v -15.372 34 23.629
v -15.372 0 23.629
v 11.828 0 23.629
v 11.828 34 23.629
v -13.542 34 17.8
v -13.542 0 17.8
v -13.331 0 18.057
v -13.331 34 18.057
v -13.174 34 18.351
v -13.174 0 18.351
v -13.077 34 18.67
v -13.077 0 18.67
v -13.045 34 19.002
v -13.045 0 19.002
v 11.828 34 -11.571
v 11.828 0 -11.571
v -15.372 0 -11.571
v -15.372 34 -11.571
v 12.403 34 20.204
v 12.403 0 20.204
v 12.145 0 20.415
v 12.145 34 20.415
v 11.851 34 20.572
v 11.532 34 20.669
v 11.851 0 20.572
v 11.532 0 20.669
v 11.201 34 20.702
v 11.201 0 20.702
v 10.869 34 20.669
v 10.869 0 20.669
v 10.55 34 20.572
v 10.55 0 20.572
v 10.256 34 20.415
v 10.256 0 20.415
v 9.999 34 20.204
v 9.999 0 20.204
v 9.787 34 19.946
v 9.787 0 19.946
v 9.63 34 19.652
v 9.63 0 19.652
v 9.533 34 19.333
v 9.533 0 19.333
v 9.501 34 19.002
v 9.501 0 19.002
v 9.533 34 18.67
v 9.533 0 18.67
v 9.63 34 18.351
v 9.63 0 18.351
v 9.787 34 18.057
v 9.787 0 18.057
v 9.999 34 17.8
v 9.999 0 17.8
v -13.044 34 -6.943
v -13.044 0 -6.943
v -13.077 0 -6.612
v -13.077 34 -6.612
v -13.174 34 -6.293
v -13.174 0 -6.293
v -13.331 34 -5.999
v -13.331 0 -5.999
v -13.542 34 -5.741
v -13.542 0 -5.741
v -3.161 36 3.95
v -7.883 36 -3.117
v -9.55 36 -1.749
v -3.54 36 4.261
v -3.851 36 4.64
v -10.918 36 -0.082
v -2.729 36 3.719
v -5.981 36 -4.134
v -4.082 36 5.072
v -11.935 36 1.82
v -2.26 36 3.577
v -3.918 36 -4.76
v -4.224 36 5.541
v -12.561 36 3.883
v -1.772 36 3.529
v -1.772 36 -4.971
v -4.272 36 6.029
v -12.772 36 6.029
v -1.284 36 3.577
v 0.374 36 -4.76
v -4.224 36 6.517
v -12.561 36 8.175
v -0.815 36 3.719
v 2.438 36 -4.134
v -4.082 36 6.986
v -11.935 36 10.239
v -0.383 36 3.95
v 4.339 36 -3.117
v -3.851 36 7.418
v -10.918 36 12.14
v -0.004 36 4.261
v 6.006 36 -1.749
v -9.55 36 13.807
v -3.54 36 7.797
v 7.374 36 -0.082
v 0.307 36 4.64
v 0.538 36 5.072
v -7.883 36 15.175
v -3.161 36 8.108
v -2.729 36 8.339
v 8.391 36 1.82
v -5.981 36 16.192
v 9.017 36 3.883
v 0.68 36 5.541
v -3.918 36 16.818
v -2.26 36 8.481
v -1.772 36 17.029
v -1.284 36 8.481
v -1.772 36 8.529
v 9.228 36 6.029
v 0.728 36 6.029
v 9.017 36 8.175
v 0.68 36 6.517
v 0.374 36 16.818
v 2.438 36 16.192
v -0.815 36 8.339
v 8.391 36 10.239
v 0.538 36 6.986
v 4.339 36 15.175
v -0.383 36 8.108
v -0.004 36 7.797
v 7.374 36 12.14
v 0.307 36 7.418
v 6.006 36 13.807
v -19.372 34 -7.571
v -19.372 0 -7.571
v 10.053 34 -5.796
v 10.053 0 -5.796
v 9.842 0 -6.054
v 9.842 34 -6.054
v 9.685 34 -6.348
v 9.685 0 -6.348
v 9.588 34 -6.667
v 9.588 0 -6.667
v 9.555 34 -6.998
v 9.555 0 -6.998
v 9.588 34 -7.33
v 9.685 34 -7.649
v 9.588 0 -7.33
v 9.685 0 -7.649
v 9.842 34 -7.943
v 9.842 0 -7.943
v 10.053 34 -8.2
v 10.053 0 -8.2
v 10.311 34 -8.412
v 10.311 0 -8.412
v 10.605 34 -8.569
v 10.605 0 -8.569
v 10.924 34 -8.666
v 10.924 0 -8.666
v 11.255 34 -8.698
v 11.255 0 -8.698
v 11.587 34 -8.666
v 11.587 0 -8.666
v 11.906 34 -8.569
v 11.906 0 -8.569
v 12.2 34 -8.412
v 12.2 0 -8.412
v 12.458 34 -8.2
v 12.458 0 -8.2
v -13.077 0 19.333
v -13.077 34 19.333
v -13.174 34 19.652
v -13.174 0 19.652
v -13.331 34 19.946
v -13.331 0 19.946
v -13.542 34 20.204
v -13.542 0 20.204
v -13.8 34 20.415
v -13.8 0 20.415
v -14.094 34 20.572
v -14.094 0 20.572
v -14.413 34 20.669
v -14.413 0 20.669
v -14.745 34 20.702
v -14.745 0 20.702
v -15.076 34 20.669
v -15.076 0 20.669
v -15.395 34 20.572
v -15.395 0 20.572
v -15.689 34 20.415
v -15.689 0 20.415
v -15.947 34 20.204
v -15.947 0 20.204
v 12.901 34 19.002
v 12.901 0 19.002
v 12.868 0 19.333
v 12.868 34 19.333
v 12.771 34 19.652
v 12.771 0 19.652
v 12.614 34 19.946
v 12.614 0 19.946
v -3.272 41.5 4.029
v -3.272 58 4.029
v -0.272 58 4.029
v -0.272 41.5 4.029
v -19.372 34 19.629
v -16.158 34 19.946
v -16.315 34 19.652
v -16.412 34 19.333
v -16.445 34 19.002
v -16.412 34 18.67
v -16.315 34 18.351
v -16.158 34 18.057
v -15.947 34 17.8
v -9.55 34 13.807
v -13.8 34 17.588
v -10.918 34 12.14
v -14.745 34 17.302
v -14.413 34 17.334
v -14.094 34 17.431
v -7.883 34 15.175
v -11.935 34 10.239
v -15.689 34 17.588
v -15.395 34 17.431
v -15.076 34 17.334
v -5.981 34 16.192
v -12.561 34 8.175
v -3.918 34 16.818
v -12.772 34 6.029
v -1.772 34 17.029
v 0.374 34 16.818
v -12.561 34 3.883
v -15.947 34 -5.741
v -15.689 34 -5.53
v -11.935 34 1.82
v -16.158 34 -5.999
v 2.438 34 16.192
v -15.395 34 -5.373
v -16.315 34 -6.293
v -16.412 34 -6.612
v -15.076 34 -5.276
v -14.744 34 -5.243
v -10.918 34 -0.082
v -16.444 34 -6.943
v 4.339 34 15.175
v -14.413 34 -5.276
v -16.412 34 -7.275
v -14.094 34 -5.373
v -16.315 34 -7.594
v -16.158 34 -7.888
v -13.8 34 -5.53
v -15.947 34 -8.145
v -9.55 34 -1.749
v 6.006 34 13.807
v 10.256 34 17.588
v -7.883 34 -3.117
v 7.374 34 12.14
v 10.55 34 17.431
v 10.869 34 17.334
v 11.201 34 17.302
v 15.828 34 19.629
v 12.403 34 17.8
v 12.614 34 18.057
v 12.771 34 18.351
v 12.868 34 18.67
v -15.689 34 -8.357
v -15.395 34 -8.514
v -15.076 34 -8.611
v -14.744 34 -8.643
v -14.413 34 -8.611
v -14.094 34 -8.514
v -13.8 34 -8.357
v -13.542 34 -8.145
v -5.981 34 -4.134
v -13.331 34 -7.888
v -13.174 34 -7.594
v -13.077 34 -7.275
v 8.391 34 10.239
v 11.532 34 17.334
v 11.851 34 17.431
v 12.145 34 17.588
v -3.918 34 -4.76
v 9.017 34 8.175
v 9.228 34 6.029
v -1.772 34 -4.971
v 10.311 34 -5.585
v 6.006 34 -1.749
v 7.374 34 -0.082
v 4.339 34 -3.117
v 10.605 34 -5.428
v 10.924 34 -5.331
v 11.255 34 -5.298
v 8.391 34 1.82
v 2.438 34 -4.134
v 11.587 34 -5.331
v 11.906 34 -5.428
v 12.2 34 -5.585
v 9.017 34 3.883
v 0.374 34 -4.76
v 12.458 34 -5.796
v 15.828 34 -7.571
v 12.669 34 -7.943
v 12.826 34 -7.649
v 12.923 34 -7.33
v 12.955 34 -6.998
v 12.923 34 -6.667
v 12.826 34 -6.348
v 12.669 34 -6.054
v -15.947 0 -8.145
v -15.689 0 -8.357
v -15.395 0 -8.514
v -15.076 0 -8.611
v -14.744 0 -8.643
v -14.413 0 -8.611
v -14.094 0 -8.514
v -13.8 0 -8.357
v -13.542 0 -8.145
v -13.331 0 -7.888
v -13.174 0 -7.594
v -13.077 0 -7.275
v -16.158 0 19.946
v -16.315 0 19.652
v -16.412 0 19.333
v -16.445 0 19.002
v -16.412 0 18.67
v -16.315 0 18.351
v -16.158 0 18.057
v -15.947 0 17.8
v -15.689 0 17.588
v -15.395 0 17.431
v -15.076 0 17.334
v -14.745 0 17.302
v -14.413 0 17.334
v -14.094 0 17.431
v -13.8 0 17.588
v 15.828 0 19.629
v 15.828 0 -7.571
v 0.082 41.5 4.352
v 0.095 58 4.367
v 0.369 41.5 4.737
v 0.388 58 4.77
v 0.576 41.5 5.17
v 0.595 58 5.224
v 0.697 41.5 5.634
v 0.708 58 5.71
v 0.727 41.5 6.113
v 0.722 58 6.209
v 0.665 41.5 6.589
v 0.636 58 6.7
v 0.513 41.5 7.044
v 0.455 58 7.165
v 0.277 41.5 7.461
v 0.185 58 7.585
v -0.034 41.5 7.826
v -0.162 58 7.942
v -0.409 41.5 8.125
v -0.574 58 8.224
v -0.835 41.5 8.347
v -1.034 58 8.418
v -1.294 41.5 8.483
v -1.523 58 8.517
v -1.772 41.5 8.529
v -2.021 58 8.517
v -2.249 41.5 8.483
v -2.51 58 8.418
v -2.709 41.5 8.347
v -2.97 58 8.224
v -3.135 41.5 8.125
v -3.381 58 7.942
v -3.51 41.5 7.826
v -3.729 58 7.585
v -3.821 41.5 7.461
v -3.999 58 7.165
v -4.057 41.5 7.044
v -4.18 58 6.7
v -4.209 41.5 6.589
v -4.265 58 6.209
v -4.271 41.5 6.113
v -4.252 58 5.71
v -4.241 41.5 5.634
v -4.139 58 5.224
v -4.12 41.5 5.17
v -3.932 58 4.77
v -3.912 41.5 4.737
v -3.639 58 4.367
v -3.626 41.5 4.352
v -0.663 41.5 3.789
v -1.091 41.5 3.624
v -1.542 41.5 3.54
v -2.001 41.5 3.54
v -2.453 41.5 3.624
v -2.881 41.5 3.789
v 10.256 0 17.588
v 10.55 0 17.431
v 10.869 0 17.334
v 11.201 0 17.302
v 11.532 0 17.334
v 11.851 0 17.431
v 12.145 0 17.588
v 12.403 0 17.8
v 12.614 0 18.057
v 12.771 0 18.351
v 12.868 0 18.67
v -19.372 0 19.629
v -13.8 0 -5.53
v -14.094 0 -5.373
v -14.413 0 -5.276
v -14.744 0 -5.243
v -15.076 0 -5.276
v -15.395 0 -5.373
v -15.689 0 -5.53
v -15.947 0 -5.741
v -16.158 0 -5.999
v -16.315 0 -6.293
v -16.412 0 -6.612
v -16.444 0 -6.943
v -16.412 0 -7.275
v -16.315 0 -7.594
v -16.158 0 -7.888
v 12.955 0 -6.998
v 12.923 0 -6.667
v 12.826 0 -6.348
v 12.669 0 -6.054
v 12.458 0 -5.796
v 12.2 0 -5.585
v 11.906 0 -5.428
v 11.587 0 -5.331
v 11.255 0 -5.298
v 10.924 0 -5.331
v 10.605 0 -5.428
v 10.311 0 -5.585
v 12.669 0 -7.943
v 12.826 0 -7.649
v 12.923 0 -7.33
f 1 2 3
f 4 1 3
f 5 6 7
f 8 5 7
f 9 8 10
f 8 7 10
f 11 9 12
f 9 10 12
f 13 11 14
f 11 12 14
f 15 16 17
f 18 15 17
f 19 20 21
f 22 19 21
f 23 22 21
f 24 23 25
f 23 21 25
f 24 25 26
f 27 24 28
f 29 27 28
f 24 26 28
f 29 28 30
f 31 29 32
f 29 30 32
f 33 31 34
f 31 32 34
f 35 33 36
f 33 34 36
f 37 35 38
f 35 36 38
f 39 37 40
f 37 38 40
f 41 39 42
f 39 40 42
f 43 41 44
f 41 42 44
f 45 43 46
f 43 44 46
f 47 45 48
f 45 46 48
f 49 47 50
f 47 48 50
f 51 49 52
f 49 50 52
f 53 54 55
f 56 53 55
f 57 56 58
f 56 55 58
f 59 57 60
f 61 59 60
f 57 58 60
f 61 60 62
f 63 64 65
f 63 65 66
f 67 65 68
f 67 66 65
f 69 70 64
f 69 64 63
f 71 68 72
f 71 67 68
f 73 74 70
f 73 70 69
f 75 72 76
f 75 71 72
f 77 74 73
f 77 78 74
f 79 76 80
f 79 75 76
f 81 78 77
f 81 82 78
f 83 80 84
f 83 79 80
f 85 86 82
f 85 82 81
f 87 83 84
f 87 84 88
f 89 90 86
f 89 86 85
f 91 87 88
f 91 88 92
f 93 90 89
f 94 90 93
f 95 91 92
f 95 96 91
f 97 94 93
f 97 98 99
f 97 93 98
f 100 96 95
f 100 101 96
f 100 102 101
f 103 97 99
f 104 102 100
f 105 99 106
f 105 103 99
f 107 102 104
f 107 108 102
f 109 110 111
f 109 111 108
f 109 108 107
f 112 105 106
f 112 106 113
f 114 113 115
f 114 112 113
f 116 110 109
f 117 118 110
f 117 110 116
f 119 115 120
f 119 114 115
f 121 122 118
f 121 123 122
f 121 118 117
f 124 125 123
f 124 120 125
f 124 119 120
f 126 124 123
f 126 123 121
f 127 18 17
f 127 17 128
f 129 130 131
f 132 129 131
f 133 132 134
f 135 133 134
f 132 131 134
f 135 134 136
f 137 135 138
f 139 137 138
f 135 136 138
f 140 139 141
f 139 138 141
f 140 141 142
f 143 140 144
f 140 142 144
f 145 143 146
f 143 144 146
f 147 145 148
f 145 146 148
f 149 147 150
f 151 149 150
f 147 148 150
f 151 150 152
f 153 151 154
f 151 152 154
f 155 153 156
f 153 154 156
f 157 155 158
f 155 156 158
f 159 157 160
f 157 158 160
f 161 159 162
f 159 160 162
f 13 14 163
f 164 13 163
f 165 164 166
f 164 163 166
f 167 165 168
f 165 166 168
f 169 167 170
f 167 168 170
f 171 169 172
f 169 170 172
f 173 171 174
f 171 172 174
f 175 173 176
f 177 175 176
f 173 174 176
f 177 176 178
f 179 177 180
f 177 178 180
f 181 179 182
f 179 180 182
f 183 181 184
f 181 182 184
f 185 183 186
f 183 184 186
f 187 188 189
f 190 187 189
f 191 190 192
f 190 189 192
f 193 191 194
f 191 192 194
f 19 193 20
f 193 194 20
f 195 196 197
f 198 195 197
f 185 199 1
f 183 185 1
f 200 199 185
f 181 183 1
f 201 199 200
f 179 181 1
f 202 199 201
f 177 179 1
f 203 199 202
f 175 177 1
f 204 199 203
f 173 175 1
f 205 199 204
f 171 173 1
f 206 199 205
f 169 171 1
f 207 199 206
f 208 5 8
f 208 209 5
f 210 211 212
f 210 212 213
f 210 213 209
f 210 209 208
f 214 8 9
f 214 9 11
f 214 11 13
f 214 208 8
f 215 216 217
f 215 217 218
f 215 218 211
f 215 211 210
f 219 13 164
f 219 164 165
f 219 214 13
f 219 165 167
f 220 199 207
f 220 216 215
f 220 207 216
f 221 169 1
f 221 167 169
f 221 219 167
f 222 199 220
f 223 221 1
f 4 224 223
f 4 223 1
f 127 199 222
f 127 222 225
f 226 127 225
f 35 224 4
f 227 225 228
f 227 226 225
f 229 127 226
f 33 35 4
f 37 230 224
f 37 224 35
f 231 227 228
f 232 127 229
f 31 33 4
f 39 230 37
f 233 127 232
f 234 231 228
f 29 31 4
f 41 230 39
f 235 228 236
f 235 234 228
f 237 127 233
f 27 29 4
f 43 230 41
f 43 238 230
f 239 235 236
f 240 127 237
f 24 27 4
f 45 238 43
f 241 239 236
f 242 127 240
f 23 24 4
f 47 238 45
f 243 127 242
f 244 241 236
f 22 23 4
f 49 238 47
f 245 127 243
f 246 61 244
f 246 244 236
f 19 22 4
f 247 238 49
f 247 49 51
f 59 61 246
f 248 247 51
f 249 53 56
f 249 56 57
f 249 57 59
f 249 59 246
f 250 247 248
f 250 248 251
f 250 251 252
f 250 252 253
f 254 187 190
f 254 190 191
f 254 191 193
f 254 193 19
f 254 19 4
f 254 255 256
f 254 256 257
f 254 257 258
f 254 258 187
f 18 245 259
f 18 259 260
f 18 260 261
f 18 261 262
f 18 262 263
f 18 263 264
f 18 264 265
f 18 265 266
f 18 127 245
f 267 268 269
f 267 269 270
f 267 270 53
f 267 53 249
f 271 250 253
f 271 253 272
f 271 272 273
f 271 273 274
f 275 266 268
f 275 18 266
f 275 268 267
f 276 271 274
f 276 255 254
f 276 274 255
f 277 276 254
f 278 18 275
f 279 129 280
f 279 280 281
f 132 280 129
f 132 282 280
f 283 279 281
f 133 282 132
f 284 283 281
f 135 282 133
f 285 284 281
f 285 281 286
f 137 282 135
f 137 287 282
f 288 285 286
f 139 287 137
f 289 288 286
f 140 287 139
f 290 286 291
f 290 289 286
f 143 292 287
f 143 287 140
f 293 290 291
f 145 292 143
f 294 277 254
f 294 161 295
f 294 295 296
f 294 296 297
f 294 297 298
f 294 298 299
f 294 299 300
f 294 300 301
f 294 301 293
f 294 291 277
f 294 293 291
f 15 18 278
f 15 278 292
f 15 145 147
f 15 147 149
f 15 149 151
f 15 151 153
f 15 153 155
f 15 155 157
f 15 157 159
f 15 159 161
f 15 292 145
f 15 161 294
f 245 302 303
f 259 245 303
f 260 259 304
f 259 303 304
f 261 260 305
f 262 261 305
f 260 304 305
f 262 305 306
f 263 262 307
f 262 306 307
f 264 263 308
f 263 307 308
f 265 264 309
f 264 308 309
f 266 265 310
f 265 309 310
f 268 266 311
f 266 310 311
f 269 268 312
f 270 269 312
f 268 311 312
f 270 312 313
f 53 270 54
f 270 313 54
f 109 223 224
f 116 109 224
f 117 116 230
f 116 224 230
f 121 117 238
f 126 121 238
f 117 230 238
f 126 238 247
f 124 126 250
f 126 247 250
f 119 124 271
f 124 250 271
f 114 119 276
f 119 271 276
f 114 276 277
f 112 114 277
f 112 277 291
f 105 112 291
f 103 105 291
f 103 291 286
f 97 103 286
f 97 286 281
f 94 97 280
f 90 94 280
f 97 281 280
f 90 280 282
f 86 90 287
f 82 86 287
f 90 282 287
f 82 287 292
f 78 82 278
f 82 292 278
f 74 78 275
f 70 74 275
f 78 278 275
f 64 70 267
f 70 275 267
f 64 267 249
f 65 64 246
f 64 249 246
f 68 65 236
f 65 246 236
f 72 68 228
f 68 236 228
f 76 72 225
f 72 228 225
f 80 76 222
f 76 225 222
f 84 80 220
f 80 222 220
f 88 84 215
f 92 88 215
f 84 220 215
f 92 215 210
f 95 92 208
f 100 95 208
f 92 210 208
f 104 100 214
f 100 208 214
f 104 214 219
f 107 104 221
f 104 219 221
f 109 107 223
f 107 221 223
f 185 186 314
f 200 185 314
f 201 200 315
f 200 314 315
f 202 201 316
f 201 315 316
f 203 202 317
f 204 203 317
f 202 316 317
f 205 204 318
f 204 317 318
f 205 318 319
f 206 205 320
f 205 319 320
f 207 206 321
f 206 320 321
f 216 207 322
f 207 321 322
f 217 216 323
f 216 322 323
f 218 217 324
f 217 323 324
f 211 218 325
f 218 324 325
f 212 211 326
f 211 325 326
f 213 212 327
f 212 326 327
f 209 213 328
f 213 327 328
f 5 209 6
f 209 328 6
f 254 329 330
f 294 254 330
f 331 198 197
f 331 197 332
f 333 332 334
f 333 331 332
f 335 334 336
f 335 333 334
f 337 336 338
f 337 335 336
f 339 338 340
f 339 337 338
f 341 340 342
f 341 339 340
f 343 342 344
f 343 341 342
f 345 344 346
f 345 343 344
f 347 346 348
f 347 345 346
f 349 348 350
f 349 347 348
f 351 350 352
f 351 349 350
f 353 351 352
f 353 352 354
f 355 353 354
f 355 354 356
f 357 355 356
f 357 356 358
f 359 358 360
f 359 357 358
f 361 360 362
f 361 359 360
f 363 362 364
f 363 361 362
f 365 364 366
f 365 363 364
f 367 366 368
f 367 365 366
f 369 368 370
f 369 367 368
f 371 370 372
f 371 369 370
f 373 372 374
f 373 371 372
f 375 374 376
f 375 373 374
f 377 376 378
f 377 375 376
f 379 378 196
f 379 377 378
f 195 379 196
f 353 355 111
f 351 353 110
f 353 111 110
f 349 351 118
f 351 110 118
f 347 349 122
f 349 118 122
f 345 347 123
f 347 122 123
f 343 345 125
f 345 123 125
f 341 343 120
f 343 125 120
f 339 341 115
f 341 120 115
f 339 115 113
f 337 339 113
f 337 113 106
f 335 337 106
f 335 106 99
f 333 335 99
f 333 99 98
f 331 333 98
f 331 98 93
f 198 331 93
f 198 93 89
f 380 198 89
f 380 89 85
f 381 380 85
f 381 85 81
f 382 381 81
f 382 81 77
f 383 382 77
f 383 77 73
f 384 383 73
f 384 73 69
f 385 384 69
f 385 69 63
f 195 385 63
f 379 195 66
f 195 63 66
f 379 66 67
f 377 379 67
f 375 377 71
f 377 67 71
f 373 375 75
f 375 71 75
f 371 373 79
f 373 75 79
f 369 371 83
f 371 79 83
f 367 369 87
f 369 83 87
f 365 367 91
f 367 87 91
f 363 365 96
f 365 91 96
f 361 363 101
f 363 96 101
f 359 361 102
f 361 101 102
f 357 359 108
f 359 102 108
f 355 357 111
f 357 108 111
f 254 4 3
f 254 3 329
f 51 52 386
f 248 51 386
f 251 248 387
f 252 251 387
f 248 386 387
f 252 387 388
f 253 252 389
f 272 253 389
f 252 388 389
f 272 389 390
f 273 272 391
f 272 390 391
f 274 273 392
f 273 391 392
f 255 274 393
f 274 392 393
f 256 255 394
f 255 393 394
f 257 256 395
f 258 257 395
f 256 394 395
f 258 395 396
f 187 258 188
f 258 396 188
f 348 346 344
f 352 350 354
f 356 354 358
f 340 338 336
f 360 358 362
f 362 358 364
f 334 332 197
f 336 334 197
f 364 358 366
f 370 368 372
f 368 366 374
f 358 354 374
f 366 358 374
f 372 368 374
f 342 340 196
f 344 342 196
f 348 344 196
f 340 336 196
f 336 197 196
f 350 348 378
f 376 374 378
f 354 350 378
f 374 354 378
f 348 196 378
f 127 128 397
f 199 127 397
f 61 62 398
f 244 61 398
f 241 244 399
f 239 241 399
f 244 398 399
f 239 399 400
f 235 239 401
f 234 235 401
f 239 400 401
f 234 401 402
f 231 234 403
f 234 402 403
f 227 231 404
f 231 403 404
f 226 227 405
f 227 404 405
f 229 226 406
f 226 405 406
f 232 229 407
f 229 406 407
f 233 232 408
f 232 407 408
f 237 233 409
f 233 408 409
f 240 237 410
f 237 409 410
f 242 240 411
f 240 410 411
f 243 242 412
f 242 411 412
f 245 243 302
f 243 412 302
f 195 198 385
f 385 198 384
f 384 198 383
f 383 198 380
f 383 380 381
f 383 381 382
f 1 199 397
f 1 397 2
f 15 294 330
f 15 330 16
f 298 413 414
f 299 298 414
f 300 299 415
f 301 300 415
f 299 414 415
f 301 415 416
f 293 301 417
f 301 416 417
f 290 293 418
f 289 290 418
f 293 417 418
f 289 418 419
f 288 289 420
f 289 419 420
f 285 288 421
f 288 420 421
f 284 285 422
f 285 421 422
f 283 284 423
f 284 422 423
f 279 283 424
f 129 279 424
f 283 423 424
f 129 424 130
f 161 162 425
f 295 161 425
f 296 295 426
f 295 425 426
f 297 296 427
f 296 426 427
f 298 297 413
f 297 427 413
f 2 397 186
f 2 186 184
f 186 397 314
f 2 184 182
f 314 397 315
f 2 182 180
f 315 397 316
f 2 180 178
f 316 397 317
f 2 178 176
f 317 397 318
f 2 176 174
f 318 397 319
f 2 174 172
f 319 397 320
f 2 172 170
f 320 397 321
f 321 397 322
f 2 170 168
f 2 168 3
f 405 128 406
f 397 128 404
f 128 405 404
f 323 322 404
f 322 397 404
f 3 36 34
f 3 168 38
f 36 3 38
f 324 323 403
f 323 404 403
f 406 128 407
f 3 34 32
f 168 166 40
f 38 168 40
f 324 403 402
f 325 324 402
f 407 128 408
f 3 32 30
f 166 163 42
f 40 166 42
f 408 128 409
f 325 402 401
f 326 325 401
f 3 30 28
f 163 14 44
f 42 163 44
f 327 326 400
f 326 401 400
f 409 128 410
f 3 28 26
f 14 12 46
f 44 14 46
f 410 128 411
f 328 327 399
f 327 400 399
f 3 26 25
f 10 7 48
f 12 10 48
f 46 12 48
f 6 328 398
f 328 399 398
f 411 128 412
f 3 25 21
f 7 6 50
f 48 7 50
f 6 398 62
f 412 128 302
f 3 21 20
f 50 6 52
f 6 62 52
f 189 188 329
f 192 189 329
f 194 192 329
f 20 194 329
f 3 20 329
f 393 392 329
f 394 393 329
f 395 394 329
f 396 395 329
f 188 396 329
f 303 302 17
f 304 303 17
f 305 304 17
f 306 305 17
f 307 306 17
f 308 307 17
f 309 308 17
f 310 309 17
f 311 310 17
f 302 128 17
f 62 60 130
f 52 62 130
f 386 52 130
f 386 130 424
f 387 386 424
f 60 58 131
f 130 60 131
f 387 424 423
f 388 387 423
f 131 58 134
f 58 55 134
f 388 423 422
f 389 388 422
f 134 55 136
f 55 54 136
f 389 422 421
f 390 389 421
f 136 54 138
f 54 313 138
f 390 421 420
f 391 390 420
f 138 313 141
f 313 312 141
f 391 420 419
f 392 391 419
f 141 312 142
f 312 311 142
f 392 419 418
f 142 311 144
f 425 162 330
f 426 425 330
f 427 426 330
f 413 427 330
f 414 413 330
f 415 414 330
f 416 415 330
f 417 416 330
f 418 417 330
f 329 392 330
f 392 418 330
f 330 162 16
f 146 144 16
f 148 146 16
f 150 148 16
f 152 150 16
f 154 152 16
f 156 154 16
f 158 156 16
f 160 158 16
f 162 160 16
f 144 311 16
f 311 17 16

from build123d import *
from build123d.topology import SkipClean

# Parameters (mm, degrees)
SKETCH1_R           = 1.7
BOSS_EXTRUDE1_DEPTH = 34
SKETCH2_R           = 11
BOSS_EXTRUDE2_DEPTH = 2
SKETCH3_R           = 2.5
BOSS_EXTRUDE3_DEPTH = 5.5
BOSS_EXTRUDE4_DEPTH = 16.5


with BuildPart() as part:
    # Sketch1 → Boss-Extrude1 (new body)
    with BuildSketch(Plane(origin=(0, 0, 0), x_dir=(1, 0, 0), z_dir=(0, 1, 0))):
        Polygon((11.828075118, 11.570865707), (-15.371924882, 11.570865707), (-19.371924882, 7.570865707), (-19.371924882, -19.629134293), (-15.371924882, -23.629134293), (11.828075118, -23.629134293), (15.828075118, -19.629134293), (15.828075118, 7.570865707), align=None)
        with Locations((11.255497705, 6.998288294)):
            Circle(SKETCH1_R, mode=Mode.SUBTRACT)
        with Locations((-14.744444327, 6.943385151)):
            Circle(SKETCH1_R, mode=Mode.SUBTRACT)
        with Locations((11.200652531, -19.001711706)):
            Circle(SKETCH1_R, mode=Mode.SUBTRACT)
        with Locations((-14.744502295, -19.001711706)):
            Circle(SKETCH1_R, mode=Mode.SUBTRACT)
    extrude(amount=BOSS_EXTRUDE1_DEPTH)

    # Sketch2 → Boss-Extrude2 (add)
    with BuildSketch(Plane(origin=(0, 34, 0), x_dir=(1, 0, 0), z_dir=(0, 1, 0))):
        with Locations((-1.771924882, -6.029134293)):
            Circle(SKETCH2_R)
    extrude(amount=BOSS_EXTRUDE2_DEPTH)

    # Sketch3 → Boss-Extrude3 (add)
    with BuildSketch(Plane(origin=(0, 36, 0), x_dir=(1, 0, 0), z_dir=(0, 1, 0))):
        with Locations((-1.771924882, -6.029134293)):
            Circle(SKETCH3_R)
    extrude(amount=BOSS_EXTRUDE3_DEPTH)

    # Sketch4 → Boss-Extrude4 (add)
    with SkipClean():  # the faces are left unmerged after this step: merging them gives an invalid solid
        with BuildSketch(Plane(origin=(0, 41.5, 0), x_dir=(1, 0, 0), z_dir=(0, 1, 0))):
            with BuildLine():
                Line((-3.271924882, -4.029134293), (-0.271924882, -4.029134293))
                ThreePointArc((-0.271924882, -4.029134293), (-1.771924882, -8.529134293), (-3.271924882, -4.029134293))
            make_face()
        extrude(amount=BOSS_EXTRUDE4_DEPTH)
    add(part.part.scale(1), mode=Mode.REPLACE)  # the faces are merged on a copy


solid = part.part
